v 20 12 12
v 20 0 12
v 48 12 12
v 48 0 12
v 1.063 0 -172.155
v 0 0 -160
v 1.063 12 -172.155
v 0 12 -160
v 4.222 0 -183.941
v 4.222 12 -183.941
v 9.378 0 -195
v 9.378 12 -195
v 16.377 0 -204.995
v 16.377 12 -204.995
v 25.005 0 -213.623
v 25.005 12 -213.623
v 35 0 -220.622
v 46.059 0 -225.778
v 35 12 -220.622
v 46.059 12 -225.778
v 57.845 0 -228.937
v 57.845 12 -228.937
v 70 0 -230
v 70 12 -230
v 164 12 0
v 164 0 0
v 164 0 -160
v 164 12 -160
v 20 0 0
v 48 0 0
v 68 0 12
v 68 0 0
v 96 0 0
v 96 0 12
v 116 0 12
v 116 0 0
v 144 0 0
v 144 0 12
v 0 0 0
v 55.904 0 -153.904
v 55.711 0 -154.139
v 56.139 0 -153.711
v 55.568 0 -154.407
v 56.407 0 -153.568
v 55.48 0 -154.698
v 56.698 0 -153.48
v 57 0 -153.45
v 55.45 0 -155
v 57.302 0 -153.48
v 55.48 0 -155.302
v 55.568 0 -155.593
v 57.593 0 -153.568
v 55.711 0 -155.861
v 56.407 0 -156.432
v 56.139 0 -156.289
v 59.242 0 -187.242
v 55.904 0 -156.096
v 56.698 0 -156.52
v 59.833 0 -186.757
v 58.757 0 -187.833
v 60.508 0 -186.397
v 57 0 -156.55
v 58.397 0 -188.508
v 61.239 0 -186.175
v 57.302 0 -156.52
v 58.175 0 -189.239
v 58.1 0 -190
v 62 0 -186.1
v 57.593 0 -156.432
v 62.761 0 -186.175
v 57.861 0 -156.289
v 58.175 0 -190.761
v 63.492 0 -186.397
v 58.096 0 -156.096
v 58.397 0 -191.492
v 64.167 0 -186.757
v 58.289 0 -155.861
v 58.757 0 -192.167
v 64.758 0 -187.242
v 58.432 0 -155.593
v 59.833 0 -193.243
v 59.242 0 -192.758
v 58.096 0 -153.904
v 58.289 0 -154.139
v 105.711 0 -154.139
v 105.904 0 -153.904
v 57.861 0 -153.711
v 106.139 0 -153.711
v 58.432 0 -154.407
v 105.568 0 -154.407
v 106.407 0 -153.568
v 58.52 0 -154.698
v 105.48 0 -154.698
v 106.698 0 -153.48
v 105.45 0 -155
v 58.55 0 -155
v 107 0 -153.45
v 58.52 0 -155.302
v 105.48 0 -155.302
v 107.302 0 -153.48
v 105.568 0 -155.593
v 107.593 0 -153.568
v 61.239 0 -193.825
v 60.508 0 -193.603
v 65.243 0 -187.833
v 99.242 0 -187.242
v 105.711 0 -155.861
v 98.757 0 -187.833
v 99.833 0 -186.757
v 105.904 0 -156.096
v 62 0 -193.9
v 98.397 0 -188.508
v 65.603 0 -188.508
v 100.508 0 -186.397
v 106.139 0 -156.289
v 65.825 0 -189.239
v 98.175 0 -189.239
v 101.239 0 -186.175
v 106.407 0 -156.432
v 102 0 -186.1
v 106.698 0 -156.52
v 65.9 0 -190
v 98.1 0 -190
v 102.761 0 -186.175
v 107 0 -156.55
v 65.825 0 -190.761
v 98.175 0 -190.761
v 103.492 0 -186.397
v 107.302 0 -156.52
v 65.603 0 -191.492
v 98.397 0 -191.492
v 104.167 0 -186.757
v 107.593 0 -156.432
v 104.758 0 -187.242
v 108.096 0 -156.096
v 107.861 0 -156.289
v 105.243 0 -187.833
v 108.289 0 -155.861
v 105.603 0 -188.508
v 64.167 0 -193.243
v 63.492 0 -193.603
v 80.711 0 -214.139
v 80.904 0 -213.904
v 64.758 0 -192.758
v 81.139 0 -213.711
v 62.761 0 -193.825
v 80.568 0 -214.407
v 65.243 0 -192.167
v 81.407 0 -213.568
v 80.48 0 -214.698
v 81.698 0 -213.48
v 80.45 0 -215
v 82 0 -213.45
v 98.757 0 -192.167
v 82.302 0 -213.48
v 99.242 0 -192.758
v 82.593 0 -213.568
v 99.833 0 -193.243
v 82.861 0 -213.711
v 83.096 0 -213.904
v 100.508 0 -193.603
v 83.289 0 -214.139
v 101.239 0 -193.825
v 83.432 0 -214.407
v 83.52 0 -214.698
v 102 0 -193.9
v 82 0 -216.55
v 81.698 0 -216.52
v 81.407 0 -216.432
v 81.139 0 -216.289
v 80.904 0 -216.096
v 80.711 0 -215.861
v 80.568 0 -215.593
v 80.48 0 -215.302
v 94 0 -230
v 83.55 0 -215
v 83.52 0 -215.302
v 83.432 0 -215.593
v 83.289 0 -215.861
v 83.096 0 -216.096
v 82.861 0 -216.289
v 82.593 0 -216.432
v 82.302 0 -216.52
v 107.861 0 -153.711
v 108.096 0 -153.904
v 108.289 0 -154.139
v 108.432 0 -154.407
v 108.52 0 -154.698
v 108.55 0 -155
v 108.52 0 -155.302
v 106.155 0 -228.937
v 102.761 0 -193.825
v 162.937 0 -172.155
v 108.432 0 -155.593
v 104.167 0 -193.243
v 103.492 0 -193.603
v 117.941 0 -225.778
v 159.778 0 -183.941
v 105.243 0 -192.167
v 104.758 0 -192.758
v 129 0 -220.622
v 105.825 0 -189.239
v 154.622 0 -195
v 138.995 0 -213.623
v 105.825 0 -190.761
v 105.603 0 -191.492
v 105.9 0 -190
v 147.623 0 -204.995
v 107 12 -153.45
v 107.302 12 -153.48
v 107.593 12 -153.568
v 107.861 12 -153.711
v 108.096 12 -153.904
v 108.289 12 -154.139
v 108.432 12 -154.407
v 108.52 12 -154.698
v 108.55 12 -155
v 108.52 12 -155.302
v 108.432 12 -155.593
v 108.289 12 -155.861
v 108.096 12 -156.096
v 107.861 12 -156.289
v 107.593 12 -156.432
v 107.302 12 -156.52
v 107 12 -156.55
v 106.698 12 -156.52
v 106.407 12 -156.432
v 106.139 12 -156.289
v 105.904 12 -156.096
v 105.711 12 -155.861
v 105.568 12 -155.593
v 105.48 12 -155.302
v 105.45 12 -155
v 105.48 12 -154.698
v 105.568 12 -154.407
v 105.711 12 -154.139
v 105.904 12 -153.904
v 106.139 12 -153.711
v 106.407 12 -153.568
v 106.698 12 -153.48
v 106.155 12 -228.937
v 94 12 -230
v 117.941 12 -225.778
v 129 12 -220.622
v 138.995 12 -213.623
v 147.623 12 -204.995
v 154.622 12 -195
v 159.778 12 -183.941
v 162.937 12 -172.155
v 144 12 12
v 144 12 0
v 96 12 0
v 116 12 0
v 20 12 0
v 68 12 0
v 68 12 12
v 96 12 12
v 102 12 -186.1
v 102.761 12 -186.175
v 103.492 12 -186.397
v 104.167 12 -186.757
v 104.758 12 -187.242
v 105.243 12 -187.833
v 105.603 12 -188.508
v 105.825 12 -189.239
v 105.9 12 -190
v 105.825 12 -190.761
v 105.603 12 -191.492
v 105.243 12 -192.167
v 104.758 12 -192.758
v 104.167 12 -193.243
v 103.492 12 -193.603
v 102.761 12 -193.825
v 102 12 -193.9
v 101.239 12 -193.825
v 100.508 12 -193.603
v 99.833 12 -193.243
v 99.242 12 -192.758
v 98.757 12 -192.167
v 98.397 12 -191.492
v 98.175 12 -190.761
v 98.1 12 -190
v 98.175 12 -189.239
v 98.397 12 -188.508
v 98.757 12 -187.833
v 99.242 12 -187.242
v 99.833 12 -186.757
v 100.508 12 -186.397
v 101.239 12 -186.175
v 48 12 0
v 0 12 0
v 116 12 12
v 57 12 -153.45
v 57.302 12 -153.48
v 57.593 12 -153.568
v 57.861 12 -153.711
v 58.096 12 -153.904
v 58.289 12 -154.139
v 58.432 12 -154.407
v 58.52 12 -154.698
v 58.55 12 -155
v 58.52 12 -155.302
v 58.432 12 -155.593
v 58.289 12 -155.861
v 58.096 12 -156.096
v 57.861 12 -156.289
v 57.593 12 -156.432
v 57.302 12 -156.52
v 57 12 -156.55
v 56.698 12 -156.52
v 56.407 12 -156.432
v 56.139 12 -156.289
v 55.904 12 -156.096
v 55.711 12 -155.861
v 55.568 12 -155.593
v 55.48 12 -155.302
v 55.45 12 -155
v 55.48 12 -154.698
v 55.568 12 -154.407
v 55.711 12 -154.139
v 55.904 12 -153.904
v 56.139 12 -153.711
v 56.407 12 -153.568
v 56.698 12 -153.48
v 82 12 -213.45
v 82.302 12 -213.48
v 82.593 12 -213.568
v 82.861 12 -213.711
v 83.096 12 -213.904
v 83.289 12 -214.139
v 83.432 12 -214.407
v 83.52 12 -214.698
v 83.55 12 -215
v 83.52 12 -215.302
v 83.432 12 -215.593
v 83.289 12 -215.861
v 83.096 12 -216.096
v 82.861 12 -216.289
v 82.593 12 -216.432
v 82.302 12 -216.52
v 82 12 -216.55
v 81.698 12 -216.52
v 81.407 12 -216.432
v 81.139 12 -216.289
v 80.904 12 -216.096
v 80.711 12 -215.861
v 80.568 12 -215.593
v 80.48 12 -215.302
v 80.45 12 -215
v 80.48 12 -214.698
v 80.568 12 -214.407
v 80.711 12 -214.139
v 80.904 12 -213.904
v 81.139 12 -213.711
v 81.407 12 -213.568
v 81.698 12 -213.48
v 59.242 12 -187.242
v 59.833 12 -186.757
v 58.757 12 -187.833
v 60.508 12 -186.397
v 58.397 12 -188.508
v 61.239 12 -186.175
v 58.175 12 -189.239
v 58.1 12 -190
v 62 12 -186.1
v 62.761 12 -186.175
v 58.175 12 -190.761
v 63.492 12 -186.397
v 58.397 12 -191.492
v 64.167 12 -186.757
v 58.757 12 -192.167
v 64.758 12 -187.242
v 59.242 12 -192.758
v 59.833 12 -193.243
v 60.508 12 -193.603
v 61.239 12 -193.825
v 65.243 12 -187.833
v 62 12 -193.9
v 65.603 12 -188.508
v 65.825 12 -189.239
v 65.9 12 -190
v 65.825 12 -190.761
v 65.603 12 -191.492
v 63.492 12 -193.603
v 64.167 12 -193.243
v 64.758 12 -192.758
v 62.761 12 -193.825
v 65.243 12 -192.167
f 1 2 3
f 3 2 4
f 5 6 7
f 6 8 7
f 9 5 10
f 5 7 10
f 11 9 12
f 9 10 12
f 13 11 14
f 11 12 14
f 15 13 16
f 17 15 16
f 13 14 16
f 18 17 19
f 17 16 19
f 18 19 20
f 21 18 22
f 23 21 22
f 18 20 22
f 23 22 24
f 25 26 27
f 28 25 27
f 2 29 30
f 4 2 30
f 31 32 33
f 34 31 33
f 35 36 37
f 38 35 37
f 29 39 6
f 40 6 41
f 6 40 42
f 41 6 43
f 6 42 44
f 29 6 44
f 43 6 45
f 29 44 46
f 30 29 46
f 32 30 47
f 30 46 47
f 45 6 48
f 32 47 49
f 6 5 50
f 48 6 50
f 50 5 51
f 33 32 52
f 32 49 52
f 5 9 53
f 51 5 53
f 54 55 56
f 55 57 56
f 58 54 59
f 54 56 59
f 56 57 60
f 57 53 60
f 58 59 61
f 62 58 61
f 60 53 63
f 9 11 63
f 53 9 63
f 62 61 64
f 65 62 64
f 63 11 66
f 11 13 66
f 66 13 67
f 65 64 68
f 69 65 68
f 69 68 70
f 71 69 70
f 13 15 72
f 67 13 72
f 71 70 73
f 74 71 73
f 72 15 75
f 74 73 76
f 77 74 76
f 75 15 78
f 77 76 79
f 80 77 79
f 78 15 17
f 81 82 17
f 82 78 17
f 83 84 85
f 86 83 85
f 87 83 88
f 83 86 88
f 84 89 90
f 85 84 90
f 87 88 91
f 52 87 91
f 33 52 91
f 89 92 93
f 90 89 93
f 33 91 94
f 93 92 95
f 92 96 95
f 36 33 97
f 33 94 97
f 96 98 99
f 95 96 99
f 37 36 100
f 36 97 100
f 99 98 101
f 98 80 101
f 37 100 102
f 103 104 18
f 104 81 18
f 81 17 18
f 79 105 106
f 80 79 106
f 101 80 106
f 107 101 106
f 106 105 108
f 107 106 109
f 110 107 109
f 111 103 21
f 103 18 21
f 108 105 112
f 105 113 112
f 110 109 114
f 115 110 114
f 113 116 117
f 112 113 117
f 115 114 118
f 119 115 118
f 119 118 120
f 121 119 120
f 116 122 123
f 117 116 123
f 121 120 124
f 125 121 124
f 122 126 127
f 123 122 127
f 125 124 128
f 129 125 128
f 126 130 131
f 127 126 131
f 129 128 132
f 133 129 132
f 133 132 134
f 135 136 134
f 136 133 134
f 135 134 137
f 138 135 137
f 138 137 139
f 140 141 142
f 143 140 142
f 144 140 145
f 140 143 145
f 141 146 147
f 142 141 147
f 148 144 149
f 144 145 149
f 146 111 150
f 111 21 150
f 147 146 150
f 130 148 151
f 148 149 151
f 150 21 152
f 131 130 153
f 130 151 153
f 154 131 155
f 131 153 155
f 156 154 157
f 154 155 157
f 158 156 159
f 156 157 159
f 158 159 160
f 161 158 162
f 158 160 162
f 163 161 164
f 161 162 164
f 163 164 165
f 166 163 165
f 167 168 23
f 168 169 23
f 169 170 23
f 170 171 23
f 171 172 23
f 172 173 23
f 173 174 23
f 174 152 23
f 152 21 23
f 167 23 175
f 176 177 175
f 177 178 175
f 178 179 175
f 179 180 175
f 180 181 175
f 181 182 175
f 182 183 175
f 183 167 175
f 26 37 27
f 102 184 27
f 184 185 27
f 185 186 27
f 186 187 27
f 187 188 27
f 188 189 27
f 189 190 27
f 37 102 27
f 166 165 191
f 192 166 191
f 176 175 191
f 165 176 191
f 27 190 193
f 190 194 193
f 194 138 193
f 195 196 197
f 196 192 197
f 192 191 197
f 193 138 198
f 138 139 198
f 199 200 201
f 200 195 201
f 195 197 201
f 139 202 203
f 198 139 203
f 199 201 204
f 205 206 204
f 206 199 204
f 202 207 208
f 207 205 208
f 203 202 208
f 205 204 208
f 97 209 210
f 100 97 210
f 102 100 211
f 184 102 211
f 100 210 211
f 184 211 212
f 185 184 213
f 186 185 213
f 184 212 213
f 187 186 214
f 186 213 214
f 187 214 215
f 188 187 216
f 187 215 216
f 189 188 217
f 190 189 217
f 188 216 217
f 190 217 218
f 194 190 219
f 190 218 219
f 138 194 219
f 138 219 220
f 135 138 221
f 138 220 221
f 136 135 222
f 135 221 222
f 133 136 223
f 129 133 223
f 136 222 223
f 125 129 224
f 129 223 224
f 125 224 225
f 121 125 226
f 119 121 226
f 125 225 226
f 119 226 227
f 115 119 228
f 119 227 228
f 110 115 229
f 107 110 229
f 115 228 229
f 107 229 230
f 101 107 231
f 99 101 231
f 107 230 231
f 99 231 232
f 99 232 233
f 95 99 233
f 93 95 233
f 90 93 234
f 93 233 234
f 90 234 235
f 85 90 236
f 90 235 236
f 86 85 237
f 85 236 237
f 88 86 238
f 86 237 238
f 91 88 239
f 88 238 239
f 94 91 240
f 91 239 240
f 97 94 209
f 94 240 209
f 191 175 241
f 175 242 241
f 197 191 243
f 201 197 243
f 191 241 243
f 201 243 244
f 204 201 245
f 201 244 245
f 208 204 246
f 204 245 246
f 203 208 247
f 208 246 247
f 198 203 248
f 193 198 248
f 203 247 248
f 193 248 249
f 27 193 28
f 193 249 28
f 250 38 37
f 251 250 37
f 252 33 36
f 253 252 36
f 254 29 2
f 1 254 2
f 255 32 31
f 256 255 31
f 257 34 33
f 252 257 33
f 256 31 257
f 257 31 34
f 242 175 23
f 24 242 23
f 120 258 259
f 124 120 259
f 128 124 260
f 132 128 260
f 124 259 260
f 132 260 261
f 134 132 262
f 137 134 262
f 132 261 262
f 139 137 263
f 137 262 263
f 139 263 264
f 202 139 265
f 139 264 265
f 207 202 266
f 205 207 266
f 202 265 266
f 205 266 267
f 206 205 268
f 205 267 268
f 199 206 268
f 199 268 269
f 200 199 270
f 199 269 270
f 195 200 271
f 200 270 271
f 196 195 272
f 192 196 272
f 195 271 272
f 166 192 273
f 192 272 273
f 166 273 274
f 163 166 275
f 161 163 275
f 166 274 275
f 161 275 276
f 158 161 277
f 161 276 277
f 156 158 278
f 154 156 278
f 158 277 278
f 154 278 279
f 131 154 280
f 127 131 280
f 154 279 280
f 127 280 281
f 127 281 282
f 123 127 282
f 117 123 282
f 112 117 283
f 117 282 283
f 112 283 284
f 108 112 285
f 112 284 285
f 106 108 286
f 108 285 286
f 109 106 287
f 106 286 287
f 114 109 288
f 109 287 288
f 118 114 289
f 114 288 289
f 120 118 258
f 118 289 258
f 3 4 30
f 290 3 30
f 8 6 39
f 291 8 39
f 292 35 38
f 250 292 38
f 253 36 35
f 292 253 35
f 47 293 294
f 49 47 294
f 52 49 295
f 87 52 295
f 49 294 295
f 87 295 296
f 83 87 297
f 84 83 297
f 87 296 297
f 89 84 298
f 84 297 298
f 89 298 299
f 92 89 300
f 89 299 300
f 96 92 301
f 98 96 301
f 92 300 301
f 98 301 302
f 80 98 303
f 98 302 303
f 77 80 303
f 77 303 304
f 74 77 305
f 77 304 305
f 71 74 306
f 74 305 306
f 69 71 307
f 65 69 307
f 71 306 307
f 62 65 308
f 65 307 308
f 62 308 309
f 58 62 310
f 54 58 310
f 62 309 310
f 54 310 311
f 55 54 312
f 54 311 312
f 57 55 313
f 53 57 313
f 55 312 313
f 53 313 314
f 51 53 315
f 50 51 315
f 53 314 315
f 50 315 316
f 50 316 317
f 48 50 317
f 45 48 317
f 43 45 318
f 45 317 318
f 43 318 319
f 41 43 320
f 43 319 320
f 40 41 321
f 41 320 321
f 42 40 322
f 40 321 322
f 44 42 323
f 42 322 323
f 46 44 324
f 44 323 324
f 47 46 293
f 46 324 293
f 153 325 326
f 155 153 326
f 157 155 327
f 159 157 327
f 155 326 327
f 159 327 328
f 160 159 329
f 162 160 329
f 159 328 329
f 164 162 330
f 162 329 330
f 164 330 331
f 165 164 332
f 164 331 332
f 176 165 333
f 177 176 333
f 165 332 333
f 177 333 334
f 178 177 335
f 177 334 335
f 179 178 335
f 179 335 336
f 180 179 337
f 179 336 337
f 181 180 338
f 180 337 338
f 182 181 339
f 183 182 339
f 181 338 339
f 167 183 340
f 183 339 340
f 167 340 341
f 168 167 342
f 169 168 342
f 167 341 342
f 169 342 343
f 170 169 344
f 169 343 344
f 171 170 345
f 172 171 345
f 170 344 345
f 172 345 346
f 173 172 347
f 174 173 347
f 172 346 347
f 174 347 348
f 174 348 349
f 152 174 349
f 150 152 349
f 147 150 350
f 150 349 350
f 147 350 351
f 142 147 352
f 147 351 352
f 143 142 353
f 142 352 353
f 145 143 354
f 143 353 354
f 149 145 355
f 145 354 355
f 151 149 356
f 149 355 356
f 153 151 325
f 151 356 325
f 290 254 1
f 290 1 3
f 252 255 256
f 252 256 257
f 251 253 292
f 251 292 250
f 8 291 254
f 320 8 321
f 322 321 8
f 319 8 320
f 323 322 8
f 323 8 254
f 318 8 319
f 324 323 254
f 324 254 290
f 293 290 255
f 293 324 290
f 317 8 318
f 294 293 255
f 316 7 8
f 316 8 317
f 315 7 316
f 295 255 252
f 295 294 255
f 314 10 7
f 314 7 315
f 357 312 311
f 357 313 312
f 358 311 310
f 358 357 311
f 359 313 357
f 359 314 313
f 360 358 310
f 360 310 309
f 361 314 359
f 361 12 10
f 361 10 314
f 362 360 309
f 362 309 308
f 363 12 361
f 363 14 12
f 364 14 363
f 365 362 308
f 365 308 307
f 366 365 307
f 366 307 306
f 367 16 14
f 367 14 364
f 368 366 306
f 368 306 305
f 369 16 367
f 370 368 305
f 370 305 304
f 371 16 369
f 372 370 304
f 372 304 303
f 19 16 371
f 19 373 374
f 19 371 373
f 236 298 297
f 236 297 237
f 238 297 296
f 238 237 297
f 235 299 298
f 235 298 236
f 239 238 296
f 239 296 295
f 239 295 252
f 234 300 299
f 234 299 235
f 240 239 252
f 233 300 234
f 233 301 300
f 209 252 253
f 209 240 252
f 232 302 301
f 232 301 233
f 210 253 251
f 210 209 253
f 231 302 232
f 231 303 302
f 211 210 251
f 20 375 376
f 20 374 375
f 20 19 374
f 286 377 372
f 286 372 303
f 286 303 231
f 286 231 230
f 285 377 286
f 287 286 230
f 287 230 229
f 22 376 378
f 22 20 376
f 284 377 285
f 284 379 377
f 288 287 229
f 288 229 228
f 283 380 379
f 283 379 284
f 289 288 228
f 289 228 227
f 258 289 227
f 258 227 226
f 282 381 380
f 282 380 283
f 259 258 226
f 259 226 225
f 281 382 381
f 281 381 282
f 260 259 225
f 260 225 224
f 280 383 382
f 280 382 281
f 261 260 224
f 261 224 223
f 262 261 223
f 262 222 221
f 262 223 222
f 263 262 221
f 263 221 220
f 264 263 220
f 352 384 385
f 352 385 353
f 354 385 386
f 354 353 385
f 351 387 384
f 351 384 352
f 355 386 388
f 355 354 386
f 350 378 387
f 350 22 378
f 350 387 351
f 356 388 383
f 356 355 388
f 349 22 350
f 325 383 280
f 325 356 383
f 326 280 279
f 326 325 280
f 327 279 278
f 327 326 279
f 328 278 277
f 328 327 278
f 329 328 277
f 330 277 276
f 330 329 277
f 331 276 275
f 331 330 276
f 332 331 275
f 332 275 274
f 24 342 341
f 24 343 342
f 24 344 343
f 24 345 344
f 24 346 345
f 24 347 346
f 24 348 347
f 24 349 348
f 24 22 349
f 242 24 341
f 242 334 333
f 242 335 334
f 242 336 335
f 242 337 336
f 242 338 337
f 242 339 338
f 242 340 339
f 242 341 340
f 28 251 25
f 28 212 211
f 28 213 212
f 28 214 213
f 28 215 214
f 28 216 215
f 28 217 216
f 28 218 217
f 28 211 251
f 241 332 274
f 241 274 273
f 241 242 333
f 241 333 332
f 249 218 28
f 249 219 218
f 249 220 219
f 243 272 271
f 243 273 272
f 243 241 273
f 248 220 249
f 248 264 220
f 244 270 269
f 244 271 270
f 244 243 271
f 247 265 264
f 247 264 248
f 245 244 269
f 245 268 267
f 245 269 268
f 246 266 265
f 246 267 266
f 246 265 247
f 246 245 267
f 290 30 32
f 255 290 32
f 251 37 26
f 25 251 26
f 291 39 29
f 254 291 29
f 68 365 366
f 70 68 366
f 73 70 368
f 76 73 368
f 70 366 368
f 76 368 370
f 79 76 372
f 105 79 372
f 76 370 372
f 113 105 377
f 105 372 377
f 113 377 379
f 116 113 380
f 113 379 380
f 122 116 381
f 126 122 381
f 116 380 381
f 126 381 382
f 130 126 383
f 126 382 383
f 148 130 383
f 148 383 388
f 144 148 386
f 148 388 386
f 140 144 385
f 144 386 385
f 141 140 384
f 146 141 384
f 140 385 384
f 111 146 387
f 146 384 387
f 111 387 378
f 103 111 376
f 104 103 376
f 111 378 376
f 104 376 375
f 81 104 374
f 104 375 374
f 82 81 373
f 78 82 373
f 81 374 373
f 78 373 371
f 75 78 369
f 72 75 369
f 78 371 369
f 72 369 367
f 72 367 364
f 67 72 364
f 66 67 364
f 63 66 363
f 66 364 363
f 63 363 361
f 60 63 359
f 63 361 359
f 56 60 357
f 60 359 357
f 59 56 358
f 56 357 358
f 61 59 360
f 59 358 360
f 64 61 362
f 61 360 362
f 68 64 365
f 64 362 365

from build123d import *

# Parameters (mm, degrees)
SALIENTE_EXTRUIR1_DEPTH = 12
CROQUIS2_R              = 1.55
CROQUIS2_R_2            = 3.9
CORTAR_EXTRUIR1_DEPTH   = 12
REDONDEO1_R             = 70


with BuildPart() as part:
    # Croquis1 → Saliente-Extruir1 (new body)
    with BuildSketch(Plane(origin=(0, 0, 0), x_dir=(1, 0, 0), z_dir=(0, 1, 0))):
        Polygon((0, 0), (20, 0), (20, -12), (48, -12), (48, 0), (68, 0), (68, -12), (96, -12), (96, 0), (116, 0), (116, -12), (144, -12), (144, 0), (164, 0), (164, 230), (0, 230), align=None)
    extrude(amount=SALIENTE_EXTRUIR1_DEPTH)

    # Croquis2 → Cortar-Extruir1 (cut)
    with BuildSketch(Plane(origin=(0, 12, 0), x_dir=(1, 0, 0), z_dir=(0, 1, 0))):
        with Locations(Location((82, 215, 0), (0, 0, 270))):
            Circle(CROQUIS2_R)
        with Locations(Location((57, 155, 0), (0, 0, 270))):
            Circle(CROQUIS2_R)
        with Locations(Location((107, 155, 0), (0, 0, 270))):
            Circle(CROQUIS2_R)
        with Locations(Location((62, 190, 0), (0, 0, 270))):
            Circle(CROQUIS2_R_2)
        with Locations(Location((102, 190, 0), (0, 0, 270))):
            Circle(CROQUIS2_R_2)
    extrude(amount=-CORTAR_EXTRUIR1_DEPTH, mode=Mode.SUBTRACT)

    # Redondeo1
    redondeo1_edges = [part.edges().sort_by_distance(p)[0] for p in [
        (164, 6, -230),
        (0, 6, -230),
    ]]
    fillet(redondeo1_edges, radius=REDONDEO1_R)


solid = part.part
